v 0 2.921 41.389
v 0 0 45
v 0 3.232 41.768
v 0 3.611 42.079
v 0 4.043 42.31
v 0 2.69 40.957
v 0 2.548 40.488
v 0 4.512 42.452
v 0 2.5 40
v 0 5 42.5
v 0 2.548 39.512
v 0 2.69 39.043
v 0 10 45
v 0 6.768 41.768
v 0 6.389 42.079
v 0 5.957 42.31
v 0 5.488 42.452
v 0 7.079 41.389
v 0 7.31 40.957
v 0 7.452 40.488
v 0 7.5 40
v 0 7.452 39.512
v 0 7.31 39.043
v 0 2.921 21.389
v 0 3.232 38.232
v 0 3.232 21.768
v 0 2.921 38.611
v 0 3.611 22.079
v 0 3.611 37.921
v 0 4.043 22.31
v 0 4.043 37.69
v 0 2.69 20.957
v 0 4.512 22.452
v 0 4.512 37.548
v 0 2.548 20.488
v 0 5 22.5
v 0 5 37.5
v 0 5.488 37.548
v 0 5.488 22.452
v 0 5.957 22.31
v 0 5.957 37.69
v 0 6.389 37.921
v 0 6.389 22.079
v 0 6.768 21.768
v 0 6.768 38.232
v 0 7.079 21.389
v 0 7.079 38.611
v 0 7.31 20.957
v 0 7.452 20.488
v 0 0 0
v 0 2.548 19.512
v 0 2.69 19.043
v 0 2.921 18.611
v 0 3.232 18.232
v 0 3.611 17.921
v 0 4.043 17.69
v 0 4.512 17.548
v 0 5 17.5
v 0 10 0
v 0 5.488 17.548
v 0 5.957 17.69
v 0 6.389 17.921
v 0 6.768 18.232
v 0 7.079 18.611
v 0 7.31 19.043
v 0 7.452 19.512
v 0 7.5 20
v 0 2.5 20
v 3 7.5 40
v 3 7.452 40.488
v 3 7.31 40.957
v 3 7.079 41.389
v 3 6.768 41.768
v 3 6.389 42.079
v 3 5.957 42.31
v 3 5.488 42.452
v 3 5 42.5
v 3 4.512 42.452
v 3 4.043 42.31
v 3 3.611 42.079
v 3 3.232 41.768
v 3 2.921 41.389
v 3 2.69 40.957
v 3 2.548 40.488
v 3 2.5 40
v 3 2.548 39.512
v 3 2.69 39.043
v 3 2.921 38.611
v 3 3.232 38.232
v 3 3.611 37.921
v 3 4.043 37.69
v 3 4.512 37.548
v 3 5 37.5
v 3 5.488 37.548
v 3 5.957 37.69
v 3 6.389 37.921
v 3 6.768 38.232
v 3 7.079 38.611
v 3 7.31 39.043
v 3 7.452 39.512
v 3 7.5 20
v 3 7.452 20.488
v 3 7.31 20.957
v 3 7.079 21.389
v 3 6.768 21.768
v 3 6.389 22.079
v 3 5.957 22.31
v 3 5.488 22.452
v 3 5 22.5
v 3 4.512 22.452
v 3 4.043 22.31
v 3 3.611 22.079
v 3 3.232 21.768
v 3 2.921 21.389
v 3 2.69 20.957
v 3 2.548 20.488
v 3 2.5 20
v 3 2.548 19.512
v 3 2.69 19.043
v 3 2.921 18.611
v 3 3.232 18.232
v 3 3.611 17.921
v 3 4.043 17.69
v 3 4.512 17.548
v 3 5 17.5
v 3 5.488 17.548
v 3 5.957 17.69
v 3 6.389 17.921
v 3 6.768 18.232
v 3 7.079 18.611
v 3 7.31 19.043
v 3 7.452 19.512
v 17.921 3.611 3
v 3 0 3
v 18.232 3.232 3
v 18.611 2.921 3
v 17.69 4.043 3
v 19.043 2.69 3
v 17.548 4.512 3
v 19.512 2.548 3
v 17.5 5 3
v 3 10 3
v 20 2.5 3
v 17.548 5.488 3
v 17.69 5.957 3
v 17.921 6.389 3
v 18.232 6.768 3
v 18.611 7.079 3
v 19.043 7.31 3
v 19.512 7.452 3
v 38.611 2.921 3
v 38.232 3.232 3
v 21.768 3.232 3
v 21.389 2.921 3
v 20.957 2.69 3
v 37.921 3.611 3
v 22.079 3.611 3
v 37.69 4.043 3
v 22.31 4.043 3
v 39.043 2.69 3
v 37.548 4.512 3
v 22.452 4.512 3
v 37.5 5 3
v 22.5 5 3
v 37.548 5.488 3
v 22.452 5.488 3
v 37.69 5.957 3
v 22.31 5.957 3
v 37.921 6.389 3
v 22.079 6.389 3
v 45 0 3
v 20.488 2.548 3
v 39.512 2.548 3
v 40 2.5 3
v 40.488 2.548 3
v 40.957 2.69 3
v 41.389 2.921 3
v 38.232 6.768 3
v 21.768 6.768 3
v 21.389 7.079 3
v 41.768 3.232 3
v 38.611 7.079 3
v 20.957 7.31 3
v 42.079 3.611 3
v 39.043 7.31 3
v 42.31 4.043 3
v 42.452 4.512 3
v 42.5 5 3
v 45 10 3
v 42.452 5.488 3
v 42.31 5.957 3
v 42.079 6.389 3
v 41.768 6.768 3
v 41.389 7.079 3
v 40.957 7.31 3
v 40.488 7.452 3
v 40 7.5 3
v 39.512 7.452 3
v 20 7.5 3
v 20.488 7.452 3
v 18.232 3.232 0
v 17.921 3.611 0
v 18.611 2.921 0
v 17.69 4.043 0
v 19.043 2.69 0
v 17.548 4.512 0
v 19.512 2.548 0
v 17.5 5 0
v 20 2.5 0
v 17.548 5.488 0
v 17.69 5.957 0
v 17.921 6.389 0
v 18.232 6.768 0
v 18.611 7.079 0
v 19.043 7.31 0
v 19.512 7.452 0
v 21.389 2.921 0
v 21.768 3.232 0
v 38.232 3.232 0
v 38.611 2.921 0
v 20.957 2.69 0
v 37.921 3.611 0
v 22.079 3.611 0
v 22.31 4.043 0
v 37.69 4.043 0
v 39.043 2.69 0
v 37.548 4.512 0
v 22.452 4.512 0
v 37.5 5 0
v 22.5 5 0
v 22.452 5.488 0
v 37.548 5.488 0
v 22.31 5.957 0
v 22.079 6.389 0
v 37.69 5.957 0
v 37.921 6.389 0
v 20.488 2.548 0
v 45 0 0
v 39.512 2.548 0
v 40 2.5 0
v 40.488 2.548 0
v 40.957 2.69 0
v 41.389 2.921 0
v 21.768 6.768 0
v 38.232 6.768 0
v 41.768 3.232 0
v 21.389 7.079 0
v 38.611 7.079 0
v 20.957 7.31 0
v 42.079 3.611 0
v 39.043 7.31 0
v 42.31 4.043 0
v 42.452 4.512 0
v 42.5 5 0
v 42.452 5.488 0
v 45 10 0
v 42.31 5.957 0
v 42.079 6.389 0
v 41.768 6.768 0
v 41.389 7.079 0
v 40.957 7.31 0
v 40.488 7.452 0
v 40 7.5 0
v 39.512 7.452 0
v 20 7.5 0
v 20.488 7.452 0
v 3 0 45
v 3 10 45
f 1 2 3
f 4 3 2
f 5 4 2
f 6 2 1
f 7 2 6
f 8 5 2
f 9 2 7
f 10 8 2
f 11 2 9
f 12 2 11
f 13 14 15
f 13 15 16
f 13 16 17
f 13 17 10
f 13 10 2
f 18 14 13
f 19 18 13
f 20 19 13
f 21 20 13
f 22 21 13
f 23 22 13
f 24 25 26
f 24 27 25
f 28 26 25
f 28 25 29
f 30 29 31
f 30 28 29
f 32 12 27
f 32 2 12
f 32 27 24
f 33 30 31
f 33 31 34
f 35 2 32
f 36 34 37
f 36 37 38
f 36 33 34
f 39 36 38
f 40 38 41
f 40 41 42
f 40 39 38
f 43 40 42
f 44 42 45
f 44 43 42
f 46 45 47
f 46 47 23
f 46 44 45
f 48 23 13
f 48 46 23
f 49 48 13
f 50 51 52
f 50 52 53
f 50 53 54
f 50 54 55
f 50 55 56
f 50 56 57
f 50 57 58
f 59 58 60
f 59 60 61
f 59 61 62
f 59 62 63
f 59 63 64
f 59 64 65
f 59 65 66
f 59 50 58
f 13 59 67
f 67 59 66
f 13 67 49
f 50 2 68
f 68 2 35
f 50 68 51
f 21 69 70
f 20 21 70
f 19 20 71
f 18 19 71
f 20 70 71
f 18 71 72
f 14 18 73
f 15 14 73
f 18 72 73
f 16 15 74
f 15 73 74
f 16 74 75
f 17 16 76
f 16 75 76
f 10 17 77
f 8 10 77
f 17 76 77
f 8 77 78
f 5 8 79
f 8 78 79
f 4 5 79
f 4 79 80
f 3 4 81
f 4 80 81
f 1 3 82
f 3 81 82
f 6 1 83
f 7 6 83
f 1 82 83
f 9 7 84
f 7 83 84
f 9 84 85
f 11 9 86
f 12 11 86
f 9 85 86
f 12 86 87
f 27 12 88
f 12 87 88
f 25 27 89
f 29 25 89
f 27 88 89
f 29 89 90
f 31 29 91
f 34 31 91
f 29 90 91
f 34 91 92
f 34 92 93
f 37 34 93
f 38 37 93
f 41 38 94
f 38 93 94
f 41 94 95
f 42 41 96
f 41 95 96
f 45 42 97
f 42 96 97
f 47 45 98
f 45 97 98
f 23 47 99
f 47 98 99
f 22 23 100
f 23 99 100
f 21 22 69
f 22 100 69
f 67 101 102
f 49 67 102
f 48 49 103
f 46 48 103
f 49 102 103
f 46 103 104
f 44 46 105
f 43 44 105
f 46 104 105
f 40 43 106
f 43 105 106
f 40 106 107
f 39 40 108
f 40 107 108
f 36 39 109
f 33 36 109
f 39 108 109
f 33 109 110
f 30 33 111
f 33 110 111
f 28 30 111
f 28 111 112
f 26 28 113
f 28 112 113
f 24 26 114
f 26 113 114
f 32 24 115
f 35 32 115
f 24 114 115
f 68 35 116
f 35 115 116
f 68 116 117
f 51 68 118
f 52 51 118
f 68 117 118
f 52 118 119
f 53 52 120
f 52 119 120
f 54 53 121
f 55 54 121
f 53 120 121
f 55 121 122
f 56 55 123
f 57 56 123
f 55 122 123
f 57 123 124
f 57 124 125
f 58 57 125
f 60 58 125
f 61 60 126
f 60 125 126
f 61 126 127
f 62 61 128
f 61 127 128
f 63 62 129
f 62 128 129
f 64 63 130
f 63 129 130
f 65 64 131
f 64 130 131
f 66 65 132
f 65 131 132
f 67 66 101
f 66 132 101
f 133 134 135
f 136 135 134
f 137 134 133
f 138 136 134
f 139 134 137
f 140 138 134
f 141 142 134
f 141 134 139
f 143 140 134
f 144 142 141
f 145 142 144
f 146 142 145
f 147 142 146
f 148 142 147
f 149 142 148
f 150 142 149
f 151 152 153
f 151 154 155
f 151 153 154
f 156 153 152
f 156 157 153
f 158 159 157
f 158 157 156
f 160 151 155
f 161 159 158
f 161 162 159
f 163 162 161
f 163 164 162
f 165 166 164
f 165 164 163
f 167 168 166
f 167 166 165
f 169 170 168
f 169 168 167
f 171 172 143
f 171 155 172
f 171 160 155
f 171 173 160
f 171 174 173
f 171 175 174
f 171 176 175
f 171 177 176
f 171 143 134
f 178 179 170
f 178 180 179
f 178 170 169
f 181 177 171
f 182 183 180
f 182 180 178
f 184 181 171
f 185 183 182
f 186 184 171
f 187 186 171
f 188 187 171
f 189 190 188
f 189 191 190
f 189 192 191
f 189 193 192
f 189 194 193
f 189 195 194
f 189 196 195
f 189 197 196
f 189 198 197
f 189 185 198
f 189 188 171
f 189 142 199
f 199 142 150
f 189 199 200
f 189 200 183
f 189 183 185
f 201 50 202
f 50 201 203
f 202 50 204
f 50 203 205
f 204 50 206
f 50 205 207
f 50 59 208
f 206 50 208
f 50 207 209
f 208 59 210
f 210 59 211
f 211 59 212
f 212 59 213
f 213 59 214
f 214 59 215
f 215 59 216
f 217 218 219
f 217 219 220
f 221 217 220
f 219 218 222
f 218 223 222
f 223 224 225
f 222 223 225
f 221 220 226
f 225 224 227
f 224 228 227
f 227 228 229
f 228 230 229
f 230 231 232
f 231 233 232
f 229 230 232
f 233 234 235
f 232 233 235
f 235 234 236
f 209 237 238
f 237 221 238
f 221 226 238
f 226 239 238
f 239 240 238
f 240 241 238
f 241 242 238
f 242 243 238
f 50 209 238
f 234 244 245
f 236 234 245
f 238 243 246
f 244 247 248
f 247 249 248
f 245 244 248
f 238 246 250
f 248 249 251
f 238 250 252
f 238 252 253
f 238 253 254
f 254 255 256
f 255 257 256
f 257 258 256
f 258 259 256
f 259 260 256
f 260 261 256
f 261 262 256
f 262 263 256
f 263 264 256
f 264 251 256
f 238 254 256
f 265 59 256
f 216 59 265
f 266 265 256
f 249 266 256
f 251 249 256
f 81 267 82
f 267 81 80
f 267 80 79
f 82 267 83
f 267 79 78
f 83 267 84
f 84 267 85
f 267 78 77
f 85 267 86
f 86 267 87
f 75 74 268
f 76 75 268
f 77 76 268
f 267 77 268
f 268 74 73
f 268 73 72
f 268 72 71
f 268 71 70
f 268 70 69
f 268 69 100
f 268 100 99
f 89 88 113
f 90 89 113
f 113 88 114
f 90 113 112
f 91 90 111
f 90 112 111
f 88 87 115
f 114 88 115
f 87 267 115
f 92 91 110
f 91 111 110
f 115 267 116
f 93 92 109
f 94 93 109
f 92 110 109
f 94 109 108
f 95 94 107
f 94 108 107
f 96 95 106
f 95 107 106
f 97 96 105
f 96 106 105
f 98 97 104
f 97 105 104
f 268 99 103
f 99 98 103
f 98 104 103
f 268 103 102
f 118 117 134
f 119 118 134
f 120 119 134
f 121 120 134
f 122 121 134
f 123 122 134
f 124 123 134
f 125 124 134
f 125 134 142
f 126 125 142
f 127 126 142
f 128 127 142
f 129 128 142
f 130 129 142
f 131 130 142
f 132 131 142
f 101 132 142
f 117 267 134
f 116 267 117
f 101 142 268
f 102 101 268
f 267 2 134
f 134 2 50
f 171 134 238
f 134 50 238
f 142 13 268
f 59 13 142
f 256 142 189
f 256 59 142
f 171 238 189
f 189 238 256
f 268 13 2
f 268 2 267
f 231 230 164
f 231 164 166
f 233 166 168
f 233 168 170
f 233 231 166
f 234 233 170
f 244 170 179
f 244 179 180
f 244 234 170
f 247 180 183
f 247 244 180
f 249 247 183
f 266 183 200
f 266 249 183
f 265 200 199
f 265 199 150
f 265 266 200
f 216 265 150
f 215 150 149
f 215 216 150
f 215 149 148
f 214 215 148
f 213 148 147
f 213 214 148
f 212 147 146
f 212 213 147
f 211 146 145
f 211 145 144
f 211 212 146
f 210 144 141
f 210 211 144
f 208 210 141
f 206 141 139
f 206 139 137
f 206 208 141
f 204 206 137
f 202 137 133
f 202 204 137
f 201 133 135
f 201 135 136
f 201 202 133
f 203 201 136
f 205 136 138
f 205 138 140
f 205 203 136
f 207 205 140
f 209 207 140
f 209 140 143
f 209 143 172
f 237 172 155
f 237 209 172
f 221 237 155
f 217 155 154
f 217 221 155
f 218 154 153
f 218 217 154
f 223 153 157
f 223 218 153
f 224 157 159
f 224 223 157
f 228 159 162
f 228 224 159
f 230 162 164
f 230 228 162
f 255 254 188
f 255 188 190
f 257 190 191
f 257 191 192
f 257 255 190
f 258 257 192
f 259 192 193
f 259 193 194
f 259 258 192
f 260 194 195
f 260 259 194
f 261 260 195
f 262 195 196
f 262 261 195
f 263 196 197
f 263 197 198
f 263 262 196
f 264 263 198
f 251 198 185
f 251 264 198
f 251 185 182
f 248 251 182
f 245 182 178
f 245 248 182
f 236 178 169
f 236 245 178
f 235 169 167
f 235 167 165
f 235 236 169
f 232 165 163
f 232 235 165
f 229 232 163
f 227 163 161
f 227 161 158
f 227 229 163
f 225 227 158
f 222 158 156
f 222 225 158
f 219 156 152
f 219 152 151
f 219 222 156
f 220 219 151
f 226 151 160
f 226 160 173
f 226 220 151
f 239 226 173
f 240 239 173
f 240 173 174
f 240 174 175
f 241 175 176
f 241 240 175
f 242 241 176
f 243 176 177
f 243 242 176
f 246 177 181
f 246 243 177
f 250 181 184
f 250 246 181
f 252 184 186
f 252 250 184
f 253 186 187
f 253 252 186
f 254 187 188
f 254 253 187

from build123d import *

# Parameters (mm, degrees)
SKETCH1_W           = 45
SKETCH1_H           = 10
SKETCH1_R           = 2.5
BOSS_EXTRUDE1_DEPTH = 3
SKETCH2_W           = 3
SKETCH2_H           = 10
BOSS_EXTRUDE2_DEPTH = 42
SKETCH3_R           = 2.5
CUT_EXTRUDE1_DEPTH  = 3


with BuildPart() as part:
    # Sketch1 → Boss-Extrude1 (new body)
    with BuildSketch(Plane.XY):
        with Locations((22.5, 5)):
            Rectangle(SKETCH1_W, SKETCH1_H)
        with Locations((20, 5)):
            Circle(SKETCH1_R, mode=Mode.SUBTRACT)
        with Locations((40, 5)):
            Circle(SKETCH1_R, mode=Mode.SUBTRACT)
    extrude(amount=BOSS_EXTRUDE1_DEPTH)

    # Sketch2 → Boss-Extrude2 (add)
    with BuildSketch(Plane.XY.offset(3)):
        with Locations((1.5, 5)):
            Rectangle(SKETCH2_W, SKETCH2_H)
    extrude(amount=BOSS_EXTRUDE2_DEPTH)

    # Sketch3 → Cut-Extrude1 (cut)
    with BuildSketch(Plane(origin=(3, 0, 0), x_dir=(0, 0, -1), z_dir=(1, 0, 0))):
        with Locations(Location((-20, 5, 0), (0, 0, 90))):
            Circle(SKETCH3_R)
        with Locations(Location((-40, 5, 0), (0, 0, 90))):
            Circle(SKETCH3_R)
    extrude(amount=-CUT_EXTRUDE1_DEPTH, mode=Mode.SUBTRACT)


solid = part.part
